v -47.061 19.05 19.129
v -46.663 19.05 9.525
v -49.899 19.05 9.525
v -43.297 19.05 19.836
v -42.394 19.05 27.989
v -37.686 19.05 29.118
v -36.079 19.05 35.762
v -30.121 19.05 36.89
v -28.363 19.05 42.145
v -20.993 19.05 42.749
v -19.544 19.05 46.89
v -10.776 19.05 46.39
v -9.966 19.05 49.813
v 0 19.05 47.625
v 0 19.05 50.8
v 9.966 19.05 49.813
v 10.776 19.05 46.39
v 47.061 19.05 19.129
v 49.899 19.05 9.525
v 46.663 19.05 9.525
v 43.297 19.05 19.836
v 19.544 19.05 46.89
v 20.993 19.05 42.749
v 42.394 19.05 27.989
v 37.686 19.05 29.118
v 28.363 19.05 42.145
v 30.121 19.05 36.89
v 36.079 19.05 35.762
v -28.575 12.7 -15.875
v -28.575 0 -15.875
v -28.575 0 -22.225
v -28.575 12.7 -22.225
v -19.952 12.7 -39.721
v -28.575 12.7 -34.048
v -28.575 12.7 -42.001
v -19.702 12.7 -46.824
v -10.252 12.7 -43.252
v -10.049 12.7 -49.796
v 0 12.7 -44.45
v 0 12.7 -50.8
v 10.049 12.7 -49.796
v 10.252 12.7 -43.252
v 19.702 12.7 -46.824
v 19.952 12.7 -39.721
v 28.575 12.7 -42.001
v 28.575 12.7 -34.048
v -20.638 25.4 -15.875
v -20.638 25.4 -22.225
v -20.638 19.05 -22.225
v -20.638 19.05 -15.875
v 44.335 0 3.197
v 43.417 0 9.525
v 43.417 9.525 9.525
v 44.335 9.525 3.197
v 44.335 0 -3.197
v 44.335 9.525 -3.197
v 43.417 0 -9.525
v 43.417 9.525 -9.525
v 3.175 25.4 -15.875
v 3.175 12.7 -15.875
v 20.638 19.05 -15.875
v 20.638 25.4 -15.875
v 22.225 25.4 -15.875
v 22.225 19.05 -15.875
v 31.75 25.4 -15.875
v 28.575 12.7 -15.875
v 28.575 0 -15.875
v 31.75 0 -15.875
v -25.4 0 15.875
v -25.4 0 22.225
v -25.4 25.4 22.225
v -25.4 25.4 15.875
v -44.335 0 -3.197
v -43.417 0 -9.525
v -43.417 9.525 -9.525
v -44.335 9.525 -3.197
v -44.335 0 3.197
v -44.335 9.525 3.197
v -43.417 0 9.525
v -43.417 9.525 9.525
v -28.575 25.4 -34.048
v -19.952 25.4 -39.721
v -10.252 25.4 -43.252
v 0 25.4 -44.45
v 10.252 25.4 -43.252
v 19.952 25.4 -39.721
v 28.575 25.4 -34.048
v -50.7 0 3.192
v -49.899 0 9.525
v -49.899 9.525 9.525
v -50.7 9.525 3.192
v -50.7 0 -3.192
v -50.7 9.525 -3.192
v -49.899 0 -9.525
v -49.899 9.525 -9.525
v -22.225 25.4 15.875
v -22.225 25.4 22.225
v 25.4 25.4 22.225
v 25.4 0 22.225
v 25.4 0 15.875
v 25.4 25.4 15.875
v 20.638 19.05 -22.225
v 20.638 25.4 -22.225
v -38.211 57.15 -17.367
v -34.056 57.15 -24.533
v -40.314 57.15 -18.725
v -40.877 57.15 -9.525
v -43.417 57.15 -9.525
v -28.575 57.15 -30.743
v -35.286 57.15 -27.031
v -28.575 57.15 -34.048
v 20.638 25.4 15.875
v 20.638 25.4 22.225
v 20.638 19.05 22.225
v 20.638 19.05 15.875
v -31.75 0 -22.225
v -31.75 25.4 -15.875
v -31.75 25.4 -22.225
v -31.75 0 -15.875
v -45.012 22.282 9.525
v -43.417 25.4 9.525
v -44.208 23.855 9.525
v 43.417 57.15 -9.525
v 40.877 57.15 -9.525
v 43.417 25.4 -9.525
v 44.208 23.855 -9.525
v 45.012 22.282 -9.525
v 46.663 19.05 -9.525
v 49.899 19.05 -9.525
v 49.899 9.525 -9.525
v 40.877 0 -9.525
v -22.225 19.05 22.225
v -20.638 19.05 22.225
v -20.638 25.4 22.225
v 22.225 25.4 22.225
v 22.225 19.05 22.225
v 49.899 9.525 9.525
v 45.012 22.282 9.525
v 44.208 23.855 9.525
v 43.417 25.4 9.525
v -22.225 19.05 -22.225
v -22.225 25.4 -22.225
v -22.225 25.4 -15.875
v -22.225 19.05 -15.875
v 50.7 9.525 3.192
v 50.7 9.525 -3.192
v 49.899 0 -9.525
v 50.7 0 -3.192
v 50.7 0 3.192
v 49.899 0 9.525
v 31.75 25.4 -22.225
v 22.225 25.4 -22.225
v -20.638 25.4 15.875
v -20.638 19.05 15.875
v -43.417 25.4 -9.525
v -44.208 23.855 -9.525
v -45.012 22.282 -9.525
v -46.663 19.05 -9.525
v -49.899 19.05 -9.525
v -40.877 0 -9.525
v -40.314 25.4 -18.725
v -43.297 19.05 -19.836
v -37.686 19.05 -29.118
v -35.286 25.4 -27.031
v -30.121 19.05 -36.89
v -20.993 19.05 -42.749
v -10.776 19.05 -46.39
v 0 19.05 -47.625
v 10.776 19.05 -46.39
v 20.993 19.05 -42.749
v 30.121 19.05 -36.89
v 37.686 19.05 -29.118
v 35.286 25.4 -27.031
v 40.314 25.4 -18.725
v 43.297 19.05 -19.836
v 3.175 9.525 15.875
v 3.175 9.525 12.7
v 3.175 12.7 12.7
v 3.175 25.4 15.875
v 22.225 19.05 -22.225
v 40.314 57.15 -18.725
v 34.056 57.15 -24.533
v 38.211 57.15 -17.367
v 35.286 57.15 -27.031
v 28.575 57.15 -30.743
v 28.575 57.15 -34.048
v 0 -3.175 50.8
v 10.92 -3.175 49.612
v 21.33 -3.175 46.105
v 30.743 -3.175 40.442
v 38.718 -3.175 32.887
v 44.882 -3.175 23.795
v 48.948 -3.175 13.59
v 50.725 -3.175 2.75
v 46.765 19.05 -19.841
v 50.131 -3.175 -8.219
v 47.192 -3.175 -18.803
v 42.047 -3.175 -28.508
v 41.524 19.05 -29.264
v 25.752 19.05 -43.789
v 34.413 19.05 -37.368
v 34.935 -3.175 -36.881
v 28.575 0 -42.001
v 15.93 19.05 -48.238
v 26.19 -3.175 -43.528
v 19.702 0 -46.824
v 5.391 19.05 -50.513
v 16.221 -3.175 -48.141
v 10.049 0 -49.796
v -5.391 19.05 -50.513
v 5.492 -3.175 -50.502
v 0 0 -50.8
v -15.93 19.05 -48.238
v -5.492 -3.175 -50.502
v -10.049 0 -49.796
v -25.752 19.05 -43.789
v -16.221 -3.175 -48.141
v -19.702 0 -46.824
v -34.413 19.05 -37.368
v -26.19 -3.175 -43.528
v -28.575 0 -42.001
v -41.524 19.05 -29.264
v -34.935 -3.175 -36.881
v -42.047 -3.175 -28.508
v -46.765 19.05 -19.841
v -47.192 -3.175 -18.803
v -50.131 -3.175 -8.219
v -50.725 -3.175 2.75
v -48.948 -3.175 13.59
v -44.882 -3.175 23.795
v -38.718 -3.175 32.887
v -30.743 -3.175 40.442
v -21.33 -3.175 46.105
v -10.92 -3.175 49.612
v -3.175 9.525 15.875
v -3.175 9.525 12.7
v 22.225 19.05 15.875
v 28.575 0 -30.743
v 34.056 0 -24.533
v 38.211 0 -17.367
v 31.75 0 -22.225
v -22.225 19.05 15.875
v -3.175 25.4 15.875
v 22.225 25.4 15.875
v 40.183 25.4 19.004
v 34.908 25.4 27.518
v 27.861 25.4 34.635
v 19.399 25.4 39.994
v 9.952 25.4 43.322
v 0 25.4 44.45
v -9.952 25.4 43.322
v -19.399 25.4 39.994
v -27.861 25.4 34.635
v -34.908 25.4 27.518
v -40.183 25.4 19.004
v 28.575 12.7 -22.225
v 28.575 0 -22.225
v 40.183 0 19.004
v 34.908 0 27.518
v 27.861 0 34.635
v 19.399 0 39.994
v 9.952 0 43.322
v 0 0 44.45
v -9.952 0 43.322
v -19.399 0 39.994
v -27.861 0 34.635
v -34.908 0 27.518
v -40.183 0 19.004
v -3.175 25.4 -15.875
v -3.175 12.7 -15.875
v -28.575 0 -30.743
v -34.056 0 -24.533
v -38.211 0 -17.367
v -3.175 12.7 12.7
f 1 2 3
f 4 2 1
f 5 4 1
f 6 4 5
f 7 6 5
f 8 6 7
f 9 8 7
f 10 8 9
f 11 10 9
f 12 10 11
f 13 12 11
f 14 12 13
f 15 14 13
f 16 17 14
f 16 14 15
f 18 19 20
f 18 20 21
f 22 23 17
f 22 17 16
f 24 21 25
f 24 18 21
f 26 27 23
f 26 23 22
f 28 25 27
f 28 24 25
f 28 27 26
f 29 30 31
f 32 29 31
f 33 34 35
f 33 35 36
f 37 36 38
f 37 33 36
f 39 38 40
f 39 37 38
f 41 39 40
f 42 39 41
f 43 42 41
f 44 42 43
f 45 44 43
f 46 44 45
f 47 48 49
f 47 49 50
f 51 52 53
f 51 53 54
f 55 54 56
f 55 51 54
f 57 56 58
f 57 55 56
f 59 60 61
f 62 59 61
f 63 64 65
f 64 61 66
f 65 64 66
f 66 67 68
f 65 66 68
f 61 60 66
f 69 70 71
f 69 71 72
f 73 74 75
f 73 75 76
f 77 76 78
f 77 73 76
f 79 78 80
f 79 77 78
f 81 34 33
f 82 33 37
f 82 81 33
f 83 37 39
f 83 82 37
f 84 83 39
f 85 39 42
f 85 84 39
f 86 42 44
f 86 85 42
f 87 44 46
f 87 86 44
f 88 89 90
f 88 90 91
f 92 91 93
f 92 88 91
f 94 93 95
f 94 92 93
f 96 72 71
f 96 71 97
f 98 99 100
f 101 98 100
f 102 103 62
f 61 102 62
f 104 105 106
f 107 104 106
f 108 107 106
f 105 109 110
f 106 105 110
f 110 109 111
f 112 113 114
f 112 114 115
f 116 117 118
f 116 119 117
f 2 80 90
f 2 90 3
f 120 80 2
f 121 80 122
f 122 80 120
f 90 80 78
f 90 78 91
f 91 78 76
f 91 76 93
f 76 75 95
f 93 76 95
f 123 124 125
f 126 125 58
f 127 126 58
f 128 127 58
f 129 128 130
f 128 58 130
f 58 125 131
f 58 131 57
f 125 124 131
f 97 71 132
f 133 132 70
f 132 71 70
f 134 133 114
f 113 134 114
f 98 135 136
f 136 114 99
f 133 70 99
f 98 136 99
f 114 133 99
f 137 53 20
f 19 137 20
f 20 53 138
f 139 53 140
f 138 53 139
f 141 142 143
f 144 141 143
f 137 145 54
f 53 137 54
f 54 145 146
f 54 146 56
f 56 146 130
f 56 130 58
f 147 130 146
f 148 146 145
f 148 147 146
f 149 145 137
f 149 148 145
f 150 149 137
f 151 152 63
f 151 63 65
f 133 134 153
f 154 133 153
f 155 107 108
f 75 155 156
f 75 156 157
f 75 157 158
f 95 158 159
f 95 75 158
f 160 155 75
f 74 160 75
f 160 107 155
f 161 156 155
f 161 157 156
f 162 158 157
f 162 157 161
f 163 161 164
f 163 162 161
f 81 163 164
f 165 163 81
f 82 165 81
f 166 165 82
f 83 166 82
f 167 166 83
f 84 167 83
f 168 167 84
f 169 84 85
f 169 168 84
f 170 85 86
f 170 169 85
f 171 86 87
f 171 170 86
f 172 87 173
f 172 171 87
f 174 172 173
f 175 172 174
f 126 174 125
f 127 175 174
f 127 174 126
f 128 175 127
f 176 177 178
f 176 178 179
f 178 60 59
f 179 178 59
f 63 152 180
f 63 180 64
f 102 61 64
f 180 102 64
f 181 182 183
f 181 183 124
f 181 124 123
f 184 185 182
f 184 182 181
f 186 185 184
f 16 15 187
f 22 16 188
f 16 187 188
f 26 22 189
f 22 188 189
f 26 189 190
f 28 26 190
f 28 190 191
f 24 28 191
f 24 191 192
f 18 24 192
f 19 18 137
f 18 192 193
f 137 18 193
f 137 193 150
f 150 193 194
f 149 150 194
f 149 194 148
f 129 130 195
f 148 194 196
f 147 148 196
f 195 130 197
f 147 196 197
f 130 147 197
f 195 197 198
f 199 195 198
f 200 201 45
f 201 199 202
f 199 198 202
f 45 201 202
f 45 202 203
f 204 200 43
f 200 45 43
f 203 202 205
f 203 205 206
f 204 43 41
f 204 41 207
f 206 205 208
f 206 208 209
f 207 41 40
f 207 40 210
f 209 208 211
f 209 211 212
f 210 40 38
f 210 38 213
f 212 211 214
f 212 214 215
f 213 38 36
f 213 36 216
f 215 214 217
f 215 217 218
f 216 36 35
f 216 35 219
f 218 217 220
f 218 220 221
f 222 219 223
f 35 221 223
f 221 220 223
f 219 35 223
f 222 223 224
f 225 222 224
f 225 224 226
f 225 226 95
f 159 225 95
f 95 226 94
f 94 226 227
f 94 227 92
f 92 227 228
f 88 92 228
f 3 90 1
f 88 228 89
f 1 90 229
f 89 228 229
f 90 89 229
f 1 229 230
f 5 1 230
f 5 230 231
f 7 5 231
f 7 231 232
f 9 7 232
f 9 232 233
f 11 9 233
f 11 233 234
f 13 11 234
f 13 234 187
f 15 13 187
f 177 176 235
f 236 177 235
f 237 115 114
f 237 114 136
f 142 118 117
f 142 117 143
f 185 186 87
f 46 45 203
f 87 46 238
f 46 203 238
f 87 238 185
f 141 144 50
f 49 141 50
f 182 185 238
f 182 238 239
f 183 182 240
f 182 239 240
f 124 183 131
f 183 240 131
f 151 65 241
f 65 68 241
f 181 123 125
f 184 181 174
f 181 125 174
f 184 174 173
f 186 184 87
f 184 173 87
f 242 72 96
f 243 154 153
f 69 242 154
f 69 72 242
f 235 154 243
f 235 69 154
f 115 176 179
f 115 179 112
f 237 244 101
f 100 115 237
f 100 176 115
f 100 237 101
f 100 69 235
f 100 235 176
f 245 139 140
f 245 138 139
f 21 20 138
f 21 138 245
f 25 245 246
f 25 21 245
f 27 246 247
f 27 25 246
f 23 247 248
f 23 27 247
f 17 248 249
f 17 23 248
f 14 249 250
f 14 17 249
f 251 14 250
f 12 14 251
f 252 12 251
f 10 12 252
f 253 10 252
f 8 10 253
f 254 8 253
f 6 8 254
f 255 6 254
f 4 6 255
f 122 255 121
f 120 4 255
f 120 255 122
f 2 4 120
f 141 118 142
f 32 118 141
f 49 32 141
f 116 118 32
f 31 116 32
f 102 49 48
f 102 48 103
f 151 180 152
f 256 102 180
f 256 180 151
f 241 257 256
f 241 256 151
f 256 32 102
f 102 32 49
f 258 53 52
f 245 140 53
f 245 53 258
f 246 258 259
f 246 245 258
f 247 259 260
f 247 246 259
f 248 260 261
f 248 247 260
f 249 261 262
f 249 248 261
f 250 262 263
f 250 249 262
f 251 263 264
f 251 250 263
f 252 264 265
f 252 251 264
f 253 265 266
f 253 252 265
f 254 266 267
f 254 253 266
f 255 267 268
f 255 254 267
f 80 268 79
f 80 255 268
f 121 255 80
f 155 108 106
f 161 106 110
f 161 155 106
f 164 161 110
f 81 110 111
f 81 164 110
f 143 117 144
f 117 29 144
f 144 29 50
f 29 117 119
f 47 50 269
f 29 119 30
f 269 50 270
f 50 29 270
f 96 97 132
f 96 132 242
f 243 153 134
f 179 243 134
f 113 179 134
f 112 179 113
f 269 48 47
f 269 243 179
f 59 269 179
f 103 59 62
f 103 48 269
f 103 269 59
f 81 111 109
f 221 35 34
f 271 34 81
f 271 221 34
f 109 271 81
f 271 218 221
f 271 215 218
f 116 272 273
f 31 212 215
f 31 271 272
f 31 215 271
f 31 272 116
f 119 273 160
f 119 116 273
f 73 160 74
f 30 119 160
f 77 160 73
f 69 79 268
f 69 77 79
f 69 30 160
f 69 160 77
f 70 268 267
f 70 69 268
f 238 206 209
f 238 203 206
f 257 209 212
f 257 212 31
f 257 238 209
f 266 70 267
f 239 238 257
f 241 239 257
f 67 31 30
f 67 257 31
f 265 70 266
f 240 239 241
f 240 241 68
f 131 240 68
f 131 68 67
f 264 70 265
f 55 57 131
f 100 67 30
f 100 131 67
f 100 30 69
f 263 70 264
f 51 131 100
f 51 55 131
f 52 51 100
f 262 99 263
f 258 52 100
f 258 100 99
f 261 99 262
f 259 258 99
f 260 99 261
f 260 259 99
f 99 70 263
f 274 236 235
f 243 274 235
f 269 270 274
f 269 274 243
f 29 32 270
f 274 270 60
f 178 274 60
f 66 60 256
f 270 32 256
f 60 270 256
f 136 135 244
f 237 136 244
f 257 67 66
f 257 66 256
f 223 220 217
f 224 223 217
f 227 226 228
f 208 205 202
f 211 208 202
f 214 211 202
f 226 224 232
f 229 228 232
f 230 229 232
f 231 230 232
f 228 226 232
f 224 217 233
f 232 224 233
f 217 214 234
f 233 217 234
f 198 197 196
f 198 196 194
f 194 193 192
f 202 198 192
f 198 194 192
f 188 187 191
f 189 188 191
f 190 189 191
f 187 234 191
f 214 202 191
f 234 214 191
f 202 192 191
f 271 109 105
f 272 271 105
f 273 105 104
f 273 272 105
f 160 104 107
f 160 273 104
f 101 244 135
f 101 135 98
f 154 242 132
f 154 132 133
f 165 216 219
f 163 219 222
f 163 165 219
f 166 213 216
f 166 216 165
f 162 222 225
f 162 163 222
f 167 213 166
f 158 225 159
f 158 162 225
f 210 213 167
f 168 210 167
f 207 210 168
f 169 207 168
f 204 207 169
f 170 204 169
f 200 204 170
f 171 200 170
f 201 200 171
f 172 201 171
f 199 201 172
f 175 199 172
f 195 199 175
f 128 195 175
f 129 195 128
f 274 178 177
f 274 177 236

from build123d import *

# Parameters (mm, degrees)
SKETCH1_R               = 50.8
BOSS_EXTRUDE1_DEPTH     = 3.175
SKETCH2_R               = 50.8
SKETCH2_R_2             = 44.45
BOSS_EXTRUDE2_DEPTH     = 19.05
SKETCH5_W               = 50.8
SKETCH5_H               = 6.35
BOSS_EXTRUDE3_DEPTH     = 25.4
SKETCH6_W               = 1.5875
SKETCH6_H               = 6.35
CUT_EXTRUDE1_DEPTH      = 6.35
SKETCH7_W               = 19.05
SKETCH7_H               = 25.4
CUT_EXTRUDE2_DEPTH      = 51.8
CUT_EXTRUDE2_DEPTH_BACK = 51.8
SKETCH8_W               = 57.15
SKETCH8_H               = 12.7
CUT_EXTRUDE3_DEPTH      = 51.8
BOSS_EXTRUDE4_DEPTH     = 57.15
SKETCH10_W              = 6.35
SKETCH10_H              = 3.175
BOSS_EXTRUDE5_DEPTH     = 3.175
SKETCH11_W              = 3.175
SKETCH11_H              = 6.35
BOSS_EXTRUDE6_DEPTH     = 12.7
SKETCH12_W              = 63.5
SKETCH12_H              = 6.35
BOSS_EXTRUDE7_DEPTH     = 12.7
SKETCH14_W              = 6.35
SKETCH14_H              = 12.7
BOSS_EXTRUDE8_DEPTH     = 31.75
BOSS_EXTRUDE9_DEPTH     = 9.525


with BuildPart() as part:
    # Sketch1 → Boss-Extrude1 (new body)
    with BuildSketch(Plane(origin=(0, 0, 0), x_dir=(1, 0, 0), z_dir=(0, 1, 0))):
        with Locations(Location((0, 0, 0), (0, 0, 270))):  # turned: the seam where the file's is
            Circle(SKETCH1_R)
    extrude(amount=-BOSS_EXTRUDE1_DEPTH)

    # Sketch2 → Boss-Extrude2 (add)
    with BuildSketch(Plane(origin=(0, 0, 0), x_dir=(1, 0, 0), z_dir=(0, 1, 0))):
        with Locations(Location((0, 0, 0), (0, 0, 270))):  # turned: the seam where the file's is
            Circle(SKETCH2_R)
        with Locations(Location((0, 0, 0), (0, 0, 270))):  # turned: the seam where the file's is
            Circle(SKETCH2_R_2, mode=Mode.SUBTRACT)
    extrude(amount=BOSS_EXTRUDE2_DEPTH)

    # Sketch3 → Revolve3 (revolve)
    with BuildSketch(Plane.XY, mode=Mode.PRIVATE) as revolve3_sk:
        Polygon((44.45, 19.05), (44.45, 25.4), (47.625, 19.05), align=None)
    revolve(revolve3_sk.sketch.rotate(Axis((0, 6.35, 0), (0, -1, 0)), 90), axis=Axis((0, 6.35, 0), (0, -1, 0)))  # turned: the seam where the file's is

    # Sketch5 → Boss-Extrude3 (add)
    with BuildSketch(Plane(origin=(0, 0, 0), x_dir=(1, 0, 0), z_dir=(0, 1, 0))):
        with Locations((0, -19.05)):
            Rectangle(SKETCH5_W, SKETCH5_H)
    extrude(amount=BOSS_EXTRUDE3_DEPTH)

    # Sketch6 → Cut-Extrude1 (cut)
    with BuildSketch(Plane(origin=(0, 25.4, 0), x_dir=(1, 0, 0), z_dir=(0, 1, 0))):
        with Locations((-21.43125, -19.05)):
            Rectangle(SKETCH6_W, SKETCH6_H)
        with Locations((21.43125, -19.05)):
            Rectangle(SKETCH6_W, SKETCH6_H)
    cut_extrude1 = extrude(amount=-CUT_EXTRUDE1_DEPTH, mode=Mode.SUBTRACT)

    # Sketch7 → Cut-Extrude2 (cut, two sides)
    with BuildSketch(Plane(origin=(0, 0, 0), x_dir=(0, 0, -1), z_dir=(1, 0, 0))) as cut_extrude2_sk:
        with Locations((0, 12.7)):
            Rectangle(SKETCH7_W, SKETCH7_H)
    extrude(amount=CUT_EXTRUDE2_DEPTH, mode=Mode.SUBTRACT)
    extrude(cut_extrude2_sk.sketch, amount=-CUT_EXTRUDE2_DEPTH_BACK, mode=Mode.SUBTRACT)

    # Sketch8 → Cut-Extrude3 (cut, through all)
    with BuildSketch(Plane.XY):
        with Locations((0, 6.35)):
            Rectangle(SKETCH8_W, SKETCH8_H)
    extrude(amount=-CUT_EXTRUDE3_DEPTH, mode=Mode.SUBTRACT)

    # Sketch9 → Boss-Extrude4 (add)
    with BuildSketch(Plane(origin=(0, 0, 0), x_dir=(1, 0, 0), z_dir=(0, 1, 0))):
        with BuildLine():
            Line((-28.575, 34.048081811), (-28.575, 30.74349878))
            ThreePointArc((-28.575, 30.74349878), (-36.310709707, 21.05292623), (-40.877472001, 9.525))
            Line((-40.877472001, 9.525), (-43.417472001, 9.525))
            ThreePointArc((-43.417472001, 9.525), (-38.027284831, 23.015823001), (-28.575, 34.048081811))
        make_face()
        with BuildLine():
            Line((28.575, 34.048081811), (28.575, 30.74349878))
            ThreePointArc((28.575, 30.74349878), (36.310709707, 21.05292623), (40.877472001, 9.525))
            Line((40.877472001, 9.525), (43.417472001, 9.525))
            ThreePointArc((43.417472001, 9.525), (38.027284831, 23.015823001), (28.575, 34.048081811))
        make_face()
    extrude(amount=BOSS_EXTRUDE4_DEPTH)

    # Sketch10 → Boss-Extrude5 (add)
    with BuildSketch(Plane(origin=(0, 0, 15.875), x_dir=(-1, 0, 0), z_dir=(0, 0, -1))):
        with Locations((0, 11.1125)):
            Rectangle(SKETCH10_W, SKETCH10_H)
    extrude(amount=BOSS_EXTRUDE5_DEPTH)

    # Sketch11 → Boss-Extrude6 (add)
    with BuildSketch(Plane(origin=(0, 0, 0), x_dir=(1, 0, 0), z_dir=(0, 1, 0))):
        with Locations((-30.1625, 19.05)):
            Rectangle(SKETCH11_W, SKETCH11_H)
        with Locations((30.1625, 19.05)):
            Rectangle(SKETCH11_W, SKETCH11_H)
    extrude(amount=BOSS_EXTRUDE6_DEPTH)

    # Sketch12 → Boss-Extrude7 (add)
    with BuildSketch(Plane(origin=(0, 12.7, 0), x_dir=(1, 0, 0), z_dir=(0, 1, 0))):
        with Locations((0, 19.05)):
            Rectangle(SKETCH12_W, SKETCH12_H)
    extrude(amount=BOSS_EXTRUDE7_DEPTH)

    # Mirror1: Cut-Extrude1 across plane
    add(cut_extrude1.mirror(Plane.XY), mode=Mode.SUBTRACT)

    # Sketch14 → Boss-Extrude8 (add)
    with BuildSketch(Plane.XY.offset(-15.875)):
        with Locations((0, 19.05)):
            Rectangle(SKETCH14_W, SKETCH14_H)
    extrude(amount=BOSS_EXTRUDE8_DEPTH)

    # Sketch15 → Boss-Extrude9 (add)
    with BuildSketch(Plane(origin=(0, 0, 0), x_dir=(1, 0, 0), z_dir=(0, 1, 0))):
        with BuildLine():
            Line((-49.899041824, 9.525), (-43.417472001, 9.525))
            ThreePointArc((-43.417472001, 9.525), (-44.45, 0), (-43.417472001, -9.525))
            Line((-43.417472001, -9.525), (-49.899041824, -9.525))
            ThreePointArc((-49.899041824, -9.525), (-50.8, 0), (-49.899041824, 9.525))
        make_face()
        with BuildLine():
            Line((43.417472001, 9.525), (49.899041824, 9.525))
            ThreePointArc((49.899041824, 9.525), (50.8, 0), (49.899041824, -9.525))
            Line((49.899041824, -9.525), (43.417472001, -9.525))
            ThreePointArc((43.417472001, -9.525), (44.45, 0), (43.417472001, 9.525))
        make_face()
    extrude(amount=BOSS_EXTRUDE9_DEPTH)


solid = part.part
